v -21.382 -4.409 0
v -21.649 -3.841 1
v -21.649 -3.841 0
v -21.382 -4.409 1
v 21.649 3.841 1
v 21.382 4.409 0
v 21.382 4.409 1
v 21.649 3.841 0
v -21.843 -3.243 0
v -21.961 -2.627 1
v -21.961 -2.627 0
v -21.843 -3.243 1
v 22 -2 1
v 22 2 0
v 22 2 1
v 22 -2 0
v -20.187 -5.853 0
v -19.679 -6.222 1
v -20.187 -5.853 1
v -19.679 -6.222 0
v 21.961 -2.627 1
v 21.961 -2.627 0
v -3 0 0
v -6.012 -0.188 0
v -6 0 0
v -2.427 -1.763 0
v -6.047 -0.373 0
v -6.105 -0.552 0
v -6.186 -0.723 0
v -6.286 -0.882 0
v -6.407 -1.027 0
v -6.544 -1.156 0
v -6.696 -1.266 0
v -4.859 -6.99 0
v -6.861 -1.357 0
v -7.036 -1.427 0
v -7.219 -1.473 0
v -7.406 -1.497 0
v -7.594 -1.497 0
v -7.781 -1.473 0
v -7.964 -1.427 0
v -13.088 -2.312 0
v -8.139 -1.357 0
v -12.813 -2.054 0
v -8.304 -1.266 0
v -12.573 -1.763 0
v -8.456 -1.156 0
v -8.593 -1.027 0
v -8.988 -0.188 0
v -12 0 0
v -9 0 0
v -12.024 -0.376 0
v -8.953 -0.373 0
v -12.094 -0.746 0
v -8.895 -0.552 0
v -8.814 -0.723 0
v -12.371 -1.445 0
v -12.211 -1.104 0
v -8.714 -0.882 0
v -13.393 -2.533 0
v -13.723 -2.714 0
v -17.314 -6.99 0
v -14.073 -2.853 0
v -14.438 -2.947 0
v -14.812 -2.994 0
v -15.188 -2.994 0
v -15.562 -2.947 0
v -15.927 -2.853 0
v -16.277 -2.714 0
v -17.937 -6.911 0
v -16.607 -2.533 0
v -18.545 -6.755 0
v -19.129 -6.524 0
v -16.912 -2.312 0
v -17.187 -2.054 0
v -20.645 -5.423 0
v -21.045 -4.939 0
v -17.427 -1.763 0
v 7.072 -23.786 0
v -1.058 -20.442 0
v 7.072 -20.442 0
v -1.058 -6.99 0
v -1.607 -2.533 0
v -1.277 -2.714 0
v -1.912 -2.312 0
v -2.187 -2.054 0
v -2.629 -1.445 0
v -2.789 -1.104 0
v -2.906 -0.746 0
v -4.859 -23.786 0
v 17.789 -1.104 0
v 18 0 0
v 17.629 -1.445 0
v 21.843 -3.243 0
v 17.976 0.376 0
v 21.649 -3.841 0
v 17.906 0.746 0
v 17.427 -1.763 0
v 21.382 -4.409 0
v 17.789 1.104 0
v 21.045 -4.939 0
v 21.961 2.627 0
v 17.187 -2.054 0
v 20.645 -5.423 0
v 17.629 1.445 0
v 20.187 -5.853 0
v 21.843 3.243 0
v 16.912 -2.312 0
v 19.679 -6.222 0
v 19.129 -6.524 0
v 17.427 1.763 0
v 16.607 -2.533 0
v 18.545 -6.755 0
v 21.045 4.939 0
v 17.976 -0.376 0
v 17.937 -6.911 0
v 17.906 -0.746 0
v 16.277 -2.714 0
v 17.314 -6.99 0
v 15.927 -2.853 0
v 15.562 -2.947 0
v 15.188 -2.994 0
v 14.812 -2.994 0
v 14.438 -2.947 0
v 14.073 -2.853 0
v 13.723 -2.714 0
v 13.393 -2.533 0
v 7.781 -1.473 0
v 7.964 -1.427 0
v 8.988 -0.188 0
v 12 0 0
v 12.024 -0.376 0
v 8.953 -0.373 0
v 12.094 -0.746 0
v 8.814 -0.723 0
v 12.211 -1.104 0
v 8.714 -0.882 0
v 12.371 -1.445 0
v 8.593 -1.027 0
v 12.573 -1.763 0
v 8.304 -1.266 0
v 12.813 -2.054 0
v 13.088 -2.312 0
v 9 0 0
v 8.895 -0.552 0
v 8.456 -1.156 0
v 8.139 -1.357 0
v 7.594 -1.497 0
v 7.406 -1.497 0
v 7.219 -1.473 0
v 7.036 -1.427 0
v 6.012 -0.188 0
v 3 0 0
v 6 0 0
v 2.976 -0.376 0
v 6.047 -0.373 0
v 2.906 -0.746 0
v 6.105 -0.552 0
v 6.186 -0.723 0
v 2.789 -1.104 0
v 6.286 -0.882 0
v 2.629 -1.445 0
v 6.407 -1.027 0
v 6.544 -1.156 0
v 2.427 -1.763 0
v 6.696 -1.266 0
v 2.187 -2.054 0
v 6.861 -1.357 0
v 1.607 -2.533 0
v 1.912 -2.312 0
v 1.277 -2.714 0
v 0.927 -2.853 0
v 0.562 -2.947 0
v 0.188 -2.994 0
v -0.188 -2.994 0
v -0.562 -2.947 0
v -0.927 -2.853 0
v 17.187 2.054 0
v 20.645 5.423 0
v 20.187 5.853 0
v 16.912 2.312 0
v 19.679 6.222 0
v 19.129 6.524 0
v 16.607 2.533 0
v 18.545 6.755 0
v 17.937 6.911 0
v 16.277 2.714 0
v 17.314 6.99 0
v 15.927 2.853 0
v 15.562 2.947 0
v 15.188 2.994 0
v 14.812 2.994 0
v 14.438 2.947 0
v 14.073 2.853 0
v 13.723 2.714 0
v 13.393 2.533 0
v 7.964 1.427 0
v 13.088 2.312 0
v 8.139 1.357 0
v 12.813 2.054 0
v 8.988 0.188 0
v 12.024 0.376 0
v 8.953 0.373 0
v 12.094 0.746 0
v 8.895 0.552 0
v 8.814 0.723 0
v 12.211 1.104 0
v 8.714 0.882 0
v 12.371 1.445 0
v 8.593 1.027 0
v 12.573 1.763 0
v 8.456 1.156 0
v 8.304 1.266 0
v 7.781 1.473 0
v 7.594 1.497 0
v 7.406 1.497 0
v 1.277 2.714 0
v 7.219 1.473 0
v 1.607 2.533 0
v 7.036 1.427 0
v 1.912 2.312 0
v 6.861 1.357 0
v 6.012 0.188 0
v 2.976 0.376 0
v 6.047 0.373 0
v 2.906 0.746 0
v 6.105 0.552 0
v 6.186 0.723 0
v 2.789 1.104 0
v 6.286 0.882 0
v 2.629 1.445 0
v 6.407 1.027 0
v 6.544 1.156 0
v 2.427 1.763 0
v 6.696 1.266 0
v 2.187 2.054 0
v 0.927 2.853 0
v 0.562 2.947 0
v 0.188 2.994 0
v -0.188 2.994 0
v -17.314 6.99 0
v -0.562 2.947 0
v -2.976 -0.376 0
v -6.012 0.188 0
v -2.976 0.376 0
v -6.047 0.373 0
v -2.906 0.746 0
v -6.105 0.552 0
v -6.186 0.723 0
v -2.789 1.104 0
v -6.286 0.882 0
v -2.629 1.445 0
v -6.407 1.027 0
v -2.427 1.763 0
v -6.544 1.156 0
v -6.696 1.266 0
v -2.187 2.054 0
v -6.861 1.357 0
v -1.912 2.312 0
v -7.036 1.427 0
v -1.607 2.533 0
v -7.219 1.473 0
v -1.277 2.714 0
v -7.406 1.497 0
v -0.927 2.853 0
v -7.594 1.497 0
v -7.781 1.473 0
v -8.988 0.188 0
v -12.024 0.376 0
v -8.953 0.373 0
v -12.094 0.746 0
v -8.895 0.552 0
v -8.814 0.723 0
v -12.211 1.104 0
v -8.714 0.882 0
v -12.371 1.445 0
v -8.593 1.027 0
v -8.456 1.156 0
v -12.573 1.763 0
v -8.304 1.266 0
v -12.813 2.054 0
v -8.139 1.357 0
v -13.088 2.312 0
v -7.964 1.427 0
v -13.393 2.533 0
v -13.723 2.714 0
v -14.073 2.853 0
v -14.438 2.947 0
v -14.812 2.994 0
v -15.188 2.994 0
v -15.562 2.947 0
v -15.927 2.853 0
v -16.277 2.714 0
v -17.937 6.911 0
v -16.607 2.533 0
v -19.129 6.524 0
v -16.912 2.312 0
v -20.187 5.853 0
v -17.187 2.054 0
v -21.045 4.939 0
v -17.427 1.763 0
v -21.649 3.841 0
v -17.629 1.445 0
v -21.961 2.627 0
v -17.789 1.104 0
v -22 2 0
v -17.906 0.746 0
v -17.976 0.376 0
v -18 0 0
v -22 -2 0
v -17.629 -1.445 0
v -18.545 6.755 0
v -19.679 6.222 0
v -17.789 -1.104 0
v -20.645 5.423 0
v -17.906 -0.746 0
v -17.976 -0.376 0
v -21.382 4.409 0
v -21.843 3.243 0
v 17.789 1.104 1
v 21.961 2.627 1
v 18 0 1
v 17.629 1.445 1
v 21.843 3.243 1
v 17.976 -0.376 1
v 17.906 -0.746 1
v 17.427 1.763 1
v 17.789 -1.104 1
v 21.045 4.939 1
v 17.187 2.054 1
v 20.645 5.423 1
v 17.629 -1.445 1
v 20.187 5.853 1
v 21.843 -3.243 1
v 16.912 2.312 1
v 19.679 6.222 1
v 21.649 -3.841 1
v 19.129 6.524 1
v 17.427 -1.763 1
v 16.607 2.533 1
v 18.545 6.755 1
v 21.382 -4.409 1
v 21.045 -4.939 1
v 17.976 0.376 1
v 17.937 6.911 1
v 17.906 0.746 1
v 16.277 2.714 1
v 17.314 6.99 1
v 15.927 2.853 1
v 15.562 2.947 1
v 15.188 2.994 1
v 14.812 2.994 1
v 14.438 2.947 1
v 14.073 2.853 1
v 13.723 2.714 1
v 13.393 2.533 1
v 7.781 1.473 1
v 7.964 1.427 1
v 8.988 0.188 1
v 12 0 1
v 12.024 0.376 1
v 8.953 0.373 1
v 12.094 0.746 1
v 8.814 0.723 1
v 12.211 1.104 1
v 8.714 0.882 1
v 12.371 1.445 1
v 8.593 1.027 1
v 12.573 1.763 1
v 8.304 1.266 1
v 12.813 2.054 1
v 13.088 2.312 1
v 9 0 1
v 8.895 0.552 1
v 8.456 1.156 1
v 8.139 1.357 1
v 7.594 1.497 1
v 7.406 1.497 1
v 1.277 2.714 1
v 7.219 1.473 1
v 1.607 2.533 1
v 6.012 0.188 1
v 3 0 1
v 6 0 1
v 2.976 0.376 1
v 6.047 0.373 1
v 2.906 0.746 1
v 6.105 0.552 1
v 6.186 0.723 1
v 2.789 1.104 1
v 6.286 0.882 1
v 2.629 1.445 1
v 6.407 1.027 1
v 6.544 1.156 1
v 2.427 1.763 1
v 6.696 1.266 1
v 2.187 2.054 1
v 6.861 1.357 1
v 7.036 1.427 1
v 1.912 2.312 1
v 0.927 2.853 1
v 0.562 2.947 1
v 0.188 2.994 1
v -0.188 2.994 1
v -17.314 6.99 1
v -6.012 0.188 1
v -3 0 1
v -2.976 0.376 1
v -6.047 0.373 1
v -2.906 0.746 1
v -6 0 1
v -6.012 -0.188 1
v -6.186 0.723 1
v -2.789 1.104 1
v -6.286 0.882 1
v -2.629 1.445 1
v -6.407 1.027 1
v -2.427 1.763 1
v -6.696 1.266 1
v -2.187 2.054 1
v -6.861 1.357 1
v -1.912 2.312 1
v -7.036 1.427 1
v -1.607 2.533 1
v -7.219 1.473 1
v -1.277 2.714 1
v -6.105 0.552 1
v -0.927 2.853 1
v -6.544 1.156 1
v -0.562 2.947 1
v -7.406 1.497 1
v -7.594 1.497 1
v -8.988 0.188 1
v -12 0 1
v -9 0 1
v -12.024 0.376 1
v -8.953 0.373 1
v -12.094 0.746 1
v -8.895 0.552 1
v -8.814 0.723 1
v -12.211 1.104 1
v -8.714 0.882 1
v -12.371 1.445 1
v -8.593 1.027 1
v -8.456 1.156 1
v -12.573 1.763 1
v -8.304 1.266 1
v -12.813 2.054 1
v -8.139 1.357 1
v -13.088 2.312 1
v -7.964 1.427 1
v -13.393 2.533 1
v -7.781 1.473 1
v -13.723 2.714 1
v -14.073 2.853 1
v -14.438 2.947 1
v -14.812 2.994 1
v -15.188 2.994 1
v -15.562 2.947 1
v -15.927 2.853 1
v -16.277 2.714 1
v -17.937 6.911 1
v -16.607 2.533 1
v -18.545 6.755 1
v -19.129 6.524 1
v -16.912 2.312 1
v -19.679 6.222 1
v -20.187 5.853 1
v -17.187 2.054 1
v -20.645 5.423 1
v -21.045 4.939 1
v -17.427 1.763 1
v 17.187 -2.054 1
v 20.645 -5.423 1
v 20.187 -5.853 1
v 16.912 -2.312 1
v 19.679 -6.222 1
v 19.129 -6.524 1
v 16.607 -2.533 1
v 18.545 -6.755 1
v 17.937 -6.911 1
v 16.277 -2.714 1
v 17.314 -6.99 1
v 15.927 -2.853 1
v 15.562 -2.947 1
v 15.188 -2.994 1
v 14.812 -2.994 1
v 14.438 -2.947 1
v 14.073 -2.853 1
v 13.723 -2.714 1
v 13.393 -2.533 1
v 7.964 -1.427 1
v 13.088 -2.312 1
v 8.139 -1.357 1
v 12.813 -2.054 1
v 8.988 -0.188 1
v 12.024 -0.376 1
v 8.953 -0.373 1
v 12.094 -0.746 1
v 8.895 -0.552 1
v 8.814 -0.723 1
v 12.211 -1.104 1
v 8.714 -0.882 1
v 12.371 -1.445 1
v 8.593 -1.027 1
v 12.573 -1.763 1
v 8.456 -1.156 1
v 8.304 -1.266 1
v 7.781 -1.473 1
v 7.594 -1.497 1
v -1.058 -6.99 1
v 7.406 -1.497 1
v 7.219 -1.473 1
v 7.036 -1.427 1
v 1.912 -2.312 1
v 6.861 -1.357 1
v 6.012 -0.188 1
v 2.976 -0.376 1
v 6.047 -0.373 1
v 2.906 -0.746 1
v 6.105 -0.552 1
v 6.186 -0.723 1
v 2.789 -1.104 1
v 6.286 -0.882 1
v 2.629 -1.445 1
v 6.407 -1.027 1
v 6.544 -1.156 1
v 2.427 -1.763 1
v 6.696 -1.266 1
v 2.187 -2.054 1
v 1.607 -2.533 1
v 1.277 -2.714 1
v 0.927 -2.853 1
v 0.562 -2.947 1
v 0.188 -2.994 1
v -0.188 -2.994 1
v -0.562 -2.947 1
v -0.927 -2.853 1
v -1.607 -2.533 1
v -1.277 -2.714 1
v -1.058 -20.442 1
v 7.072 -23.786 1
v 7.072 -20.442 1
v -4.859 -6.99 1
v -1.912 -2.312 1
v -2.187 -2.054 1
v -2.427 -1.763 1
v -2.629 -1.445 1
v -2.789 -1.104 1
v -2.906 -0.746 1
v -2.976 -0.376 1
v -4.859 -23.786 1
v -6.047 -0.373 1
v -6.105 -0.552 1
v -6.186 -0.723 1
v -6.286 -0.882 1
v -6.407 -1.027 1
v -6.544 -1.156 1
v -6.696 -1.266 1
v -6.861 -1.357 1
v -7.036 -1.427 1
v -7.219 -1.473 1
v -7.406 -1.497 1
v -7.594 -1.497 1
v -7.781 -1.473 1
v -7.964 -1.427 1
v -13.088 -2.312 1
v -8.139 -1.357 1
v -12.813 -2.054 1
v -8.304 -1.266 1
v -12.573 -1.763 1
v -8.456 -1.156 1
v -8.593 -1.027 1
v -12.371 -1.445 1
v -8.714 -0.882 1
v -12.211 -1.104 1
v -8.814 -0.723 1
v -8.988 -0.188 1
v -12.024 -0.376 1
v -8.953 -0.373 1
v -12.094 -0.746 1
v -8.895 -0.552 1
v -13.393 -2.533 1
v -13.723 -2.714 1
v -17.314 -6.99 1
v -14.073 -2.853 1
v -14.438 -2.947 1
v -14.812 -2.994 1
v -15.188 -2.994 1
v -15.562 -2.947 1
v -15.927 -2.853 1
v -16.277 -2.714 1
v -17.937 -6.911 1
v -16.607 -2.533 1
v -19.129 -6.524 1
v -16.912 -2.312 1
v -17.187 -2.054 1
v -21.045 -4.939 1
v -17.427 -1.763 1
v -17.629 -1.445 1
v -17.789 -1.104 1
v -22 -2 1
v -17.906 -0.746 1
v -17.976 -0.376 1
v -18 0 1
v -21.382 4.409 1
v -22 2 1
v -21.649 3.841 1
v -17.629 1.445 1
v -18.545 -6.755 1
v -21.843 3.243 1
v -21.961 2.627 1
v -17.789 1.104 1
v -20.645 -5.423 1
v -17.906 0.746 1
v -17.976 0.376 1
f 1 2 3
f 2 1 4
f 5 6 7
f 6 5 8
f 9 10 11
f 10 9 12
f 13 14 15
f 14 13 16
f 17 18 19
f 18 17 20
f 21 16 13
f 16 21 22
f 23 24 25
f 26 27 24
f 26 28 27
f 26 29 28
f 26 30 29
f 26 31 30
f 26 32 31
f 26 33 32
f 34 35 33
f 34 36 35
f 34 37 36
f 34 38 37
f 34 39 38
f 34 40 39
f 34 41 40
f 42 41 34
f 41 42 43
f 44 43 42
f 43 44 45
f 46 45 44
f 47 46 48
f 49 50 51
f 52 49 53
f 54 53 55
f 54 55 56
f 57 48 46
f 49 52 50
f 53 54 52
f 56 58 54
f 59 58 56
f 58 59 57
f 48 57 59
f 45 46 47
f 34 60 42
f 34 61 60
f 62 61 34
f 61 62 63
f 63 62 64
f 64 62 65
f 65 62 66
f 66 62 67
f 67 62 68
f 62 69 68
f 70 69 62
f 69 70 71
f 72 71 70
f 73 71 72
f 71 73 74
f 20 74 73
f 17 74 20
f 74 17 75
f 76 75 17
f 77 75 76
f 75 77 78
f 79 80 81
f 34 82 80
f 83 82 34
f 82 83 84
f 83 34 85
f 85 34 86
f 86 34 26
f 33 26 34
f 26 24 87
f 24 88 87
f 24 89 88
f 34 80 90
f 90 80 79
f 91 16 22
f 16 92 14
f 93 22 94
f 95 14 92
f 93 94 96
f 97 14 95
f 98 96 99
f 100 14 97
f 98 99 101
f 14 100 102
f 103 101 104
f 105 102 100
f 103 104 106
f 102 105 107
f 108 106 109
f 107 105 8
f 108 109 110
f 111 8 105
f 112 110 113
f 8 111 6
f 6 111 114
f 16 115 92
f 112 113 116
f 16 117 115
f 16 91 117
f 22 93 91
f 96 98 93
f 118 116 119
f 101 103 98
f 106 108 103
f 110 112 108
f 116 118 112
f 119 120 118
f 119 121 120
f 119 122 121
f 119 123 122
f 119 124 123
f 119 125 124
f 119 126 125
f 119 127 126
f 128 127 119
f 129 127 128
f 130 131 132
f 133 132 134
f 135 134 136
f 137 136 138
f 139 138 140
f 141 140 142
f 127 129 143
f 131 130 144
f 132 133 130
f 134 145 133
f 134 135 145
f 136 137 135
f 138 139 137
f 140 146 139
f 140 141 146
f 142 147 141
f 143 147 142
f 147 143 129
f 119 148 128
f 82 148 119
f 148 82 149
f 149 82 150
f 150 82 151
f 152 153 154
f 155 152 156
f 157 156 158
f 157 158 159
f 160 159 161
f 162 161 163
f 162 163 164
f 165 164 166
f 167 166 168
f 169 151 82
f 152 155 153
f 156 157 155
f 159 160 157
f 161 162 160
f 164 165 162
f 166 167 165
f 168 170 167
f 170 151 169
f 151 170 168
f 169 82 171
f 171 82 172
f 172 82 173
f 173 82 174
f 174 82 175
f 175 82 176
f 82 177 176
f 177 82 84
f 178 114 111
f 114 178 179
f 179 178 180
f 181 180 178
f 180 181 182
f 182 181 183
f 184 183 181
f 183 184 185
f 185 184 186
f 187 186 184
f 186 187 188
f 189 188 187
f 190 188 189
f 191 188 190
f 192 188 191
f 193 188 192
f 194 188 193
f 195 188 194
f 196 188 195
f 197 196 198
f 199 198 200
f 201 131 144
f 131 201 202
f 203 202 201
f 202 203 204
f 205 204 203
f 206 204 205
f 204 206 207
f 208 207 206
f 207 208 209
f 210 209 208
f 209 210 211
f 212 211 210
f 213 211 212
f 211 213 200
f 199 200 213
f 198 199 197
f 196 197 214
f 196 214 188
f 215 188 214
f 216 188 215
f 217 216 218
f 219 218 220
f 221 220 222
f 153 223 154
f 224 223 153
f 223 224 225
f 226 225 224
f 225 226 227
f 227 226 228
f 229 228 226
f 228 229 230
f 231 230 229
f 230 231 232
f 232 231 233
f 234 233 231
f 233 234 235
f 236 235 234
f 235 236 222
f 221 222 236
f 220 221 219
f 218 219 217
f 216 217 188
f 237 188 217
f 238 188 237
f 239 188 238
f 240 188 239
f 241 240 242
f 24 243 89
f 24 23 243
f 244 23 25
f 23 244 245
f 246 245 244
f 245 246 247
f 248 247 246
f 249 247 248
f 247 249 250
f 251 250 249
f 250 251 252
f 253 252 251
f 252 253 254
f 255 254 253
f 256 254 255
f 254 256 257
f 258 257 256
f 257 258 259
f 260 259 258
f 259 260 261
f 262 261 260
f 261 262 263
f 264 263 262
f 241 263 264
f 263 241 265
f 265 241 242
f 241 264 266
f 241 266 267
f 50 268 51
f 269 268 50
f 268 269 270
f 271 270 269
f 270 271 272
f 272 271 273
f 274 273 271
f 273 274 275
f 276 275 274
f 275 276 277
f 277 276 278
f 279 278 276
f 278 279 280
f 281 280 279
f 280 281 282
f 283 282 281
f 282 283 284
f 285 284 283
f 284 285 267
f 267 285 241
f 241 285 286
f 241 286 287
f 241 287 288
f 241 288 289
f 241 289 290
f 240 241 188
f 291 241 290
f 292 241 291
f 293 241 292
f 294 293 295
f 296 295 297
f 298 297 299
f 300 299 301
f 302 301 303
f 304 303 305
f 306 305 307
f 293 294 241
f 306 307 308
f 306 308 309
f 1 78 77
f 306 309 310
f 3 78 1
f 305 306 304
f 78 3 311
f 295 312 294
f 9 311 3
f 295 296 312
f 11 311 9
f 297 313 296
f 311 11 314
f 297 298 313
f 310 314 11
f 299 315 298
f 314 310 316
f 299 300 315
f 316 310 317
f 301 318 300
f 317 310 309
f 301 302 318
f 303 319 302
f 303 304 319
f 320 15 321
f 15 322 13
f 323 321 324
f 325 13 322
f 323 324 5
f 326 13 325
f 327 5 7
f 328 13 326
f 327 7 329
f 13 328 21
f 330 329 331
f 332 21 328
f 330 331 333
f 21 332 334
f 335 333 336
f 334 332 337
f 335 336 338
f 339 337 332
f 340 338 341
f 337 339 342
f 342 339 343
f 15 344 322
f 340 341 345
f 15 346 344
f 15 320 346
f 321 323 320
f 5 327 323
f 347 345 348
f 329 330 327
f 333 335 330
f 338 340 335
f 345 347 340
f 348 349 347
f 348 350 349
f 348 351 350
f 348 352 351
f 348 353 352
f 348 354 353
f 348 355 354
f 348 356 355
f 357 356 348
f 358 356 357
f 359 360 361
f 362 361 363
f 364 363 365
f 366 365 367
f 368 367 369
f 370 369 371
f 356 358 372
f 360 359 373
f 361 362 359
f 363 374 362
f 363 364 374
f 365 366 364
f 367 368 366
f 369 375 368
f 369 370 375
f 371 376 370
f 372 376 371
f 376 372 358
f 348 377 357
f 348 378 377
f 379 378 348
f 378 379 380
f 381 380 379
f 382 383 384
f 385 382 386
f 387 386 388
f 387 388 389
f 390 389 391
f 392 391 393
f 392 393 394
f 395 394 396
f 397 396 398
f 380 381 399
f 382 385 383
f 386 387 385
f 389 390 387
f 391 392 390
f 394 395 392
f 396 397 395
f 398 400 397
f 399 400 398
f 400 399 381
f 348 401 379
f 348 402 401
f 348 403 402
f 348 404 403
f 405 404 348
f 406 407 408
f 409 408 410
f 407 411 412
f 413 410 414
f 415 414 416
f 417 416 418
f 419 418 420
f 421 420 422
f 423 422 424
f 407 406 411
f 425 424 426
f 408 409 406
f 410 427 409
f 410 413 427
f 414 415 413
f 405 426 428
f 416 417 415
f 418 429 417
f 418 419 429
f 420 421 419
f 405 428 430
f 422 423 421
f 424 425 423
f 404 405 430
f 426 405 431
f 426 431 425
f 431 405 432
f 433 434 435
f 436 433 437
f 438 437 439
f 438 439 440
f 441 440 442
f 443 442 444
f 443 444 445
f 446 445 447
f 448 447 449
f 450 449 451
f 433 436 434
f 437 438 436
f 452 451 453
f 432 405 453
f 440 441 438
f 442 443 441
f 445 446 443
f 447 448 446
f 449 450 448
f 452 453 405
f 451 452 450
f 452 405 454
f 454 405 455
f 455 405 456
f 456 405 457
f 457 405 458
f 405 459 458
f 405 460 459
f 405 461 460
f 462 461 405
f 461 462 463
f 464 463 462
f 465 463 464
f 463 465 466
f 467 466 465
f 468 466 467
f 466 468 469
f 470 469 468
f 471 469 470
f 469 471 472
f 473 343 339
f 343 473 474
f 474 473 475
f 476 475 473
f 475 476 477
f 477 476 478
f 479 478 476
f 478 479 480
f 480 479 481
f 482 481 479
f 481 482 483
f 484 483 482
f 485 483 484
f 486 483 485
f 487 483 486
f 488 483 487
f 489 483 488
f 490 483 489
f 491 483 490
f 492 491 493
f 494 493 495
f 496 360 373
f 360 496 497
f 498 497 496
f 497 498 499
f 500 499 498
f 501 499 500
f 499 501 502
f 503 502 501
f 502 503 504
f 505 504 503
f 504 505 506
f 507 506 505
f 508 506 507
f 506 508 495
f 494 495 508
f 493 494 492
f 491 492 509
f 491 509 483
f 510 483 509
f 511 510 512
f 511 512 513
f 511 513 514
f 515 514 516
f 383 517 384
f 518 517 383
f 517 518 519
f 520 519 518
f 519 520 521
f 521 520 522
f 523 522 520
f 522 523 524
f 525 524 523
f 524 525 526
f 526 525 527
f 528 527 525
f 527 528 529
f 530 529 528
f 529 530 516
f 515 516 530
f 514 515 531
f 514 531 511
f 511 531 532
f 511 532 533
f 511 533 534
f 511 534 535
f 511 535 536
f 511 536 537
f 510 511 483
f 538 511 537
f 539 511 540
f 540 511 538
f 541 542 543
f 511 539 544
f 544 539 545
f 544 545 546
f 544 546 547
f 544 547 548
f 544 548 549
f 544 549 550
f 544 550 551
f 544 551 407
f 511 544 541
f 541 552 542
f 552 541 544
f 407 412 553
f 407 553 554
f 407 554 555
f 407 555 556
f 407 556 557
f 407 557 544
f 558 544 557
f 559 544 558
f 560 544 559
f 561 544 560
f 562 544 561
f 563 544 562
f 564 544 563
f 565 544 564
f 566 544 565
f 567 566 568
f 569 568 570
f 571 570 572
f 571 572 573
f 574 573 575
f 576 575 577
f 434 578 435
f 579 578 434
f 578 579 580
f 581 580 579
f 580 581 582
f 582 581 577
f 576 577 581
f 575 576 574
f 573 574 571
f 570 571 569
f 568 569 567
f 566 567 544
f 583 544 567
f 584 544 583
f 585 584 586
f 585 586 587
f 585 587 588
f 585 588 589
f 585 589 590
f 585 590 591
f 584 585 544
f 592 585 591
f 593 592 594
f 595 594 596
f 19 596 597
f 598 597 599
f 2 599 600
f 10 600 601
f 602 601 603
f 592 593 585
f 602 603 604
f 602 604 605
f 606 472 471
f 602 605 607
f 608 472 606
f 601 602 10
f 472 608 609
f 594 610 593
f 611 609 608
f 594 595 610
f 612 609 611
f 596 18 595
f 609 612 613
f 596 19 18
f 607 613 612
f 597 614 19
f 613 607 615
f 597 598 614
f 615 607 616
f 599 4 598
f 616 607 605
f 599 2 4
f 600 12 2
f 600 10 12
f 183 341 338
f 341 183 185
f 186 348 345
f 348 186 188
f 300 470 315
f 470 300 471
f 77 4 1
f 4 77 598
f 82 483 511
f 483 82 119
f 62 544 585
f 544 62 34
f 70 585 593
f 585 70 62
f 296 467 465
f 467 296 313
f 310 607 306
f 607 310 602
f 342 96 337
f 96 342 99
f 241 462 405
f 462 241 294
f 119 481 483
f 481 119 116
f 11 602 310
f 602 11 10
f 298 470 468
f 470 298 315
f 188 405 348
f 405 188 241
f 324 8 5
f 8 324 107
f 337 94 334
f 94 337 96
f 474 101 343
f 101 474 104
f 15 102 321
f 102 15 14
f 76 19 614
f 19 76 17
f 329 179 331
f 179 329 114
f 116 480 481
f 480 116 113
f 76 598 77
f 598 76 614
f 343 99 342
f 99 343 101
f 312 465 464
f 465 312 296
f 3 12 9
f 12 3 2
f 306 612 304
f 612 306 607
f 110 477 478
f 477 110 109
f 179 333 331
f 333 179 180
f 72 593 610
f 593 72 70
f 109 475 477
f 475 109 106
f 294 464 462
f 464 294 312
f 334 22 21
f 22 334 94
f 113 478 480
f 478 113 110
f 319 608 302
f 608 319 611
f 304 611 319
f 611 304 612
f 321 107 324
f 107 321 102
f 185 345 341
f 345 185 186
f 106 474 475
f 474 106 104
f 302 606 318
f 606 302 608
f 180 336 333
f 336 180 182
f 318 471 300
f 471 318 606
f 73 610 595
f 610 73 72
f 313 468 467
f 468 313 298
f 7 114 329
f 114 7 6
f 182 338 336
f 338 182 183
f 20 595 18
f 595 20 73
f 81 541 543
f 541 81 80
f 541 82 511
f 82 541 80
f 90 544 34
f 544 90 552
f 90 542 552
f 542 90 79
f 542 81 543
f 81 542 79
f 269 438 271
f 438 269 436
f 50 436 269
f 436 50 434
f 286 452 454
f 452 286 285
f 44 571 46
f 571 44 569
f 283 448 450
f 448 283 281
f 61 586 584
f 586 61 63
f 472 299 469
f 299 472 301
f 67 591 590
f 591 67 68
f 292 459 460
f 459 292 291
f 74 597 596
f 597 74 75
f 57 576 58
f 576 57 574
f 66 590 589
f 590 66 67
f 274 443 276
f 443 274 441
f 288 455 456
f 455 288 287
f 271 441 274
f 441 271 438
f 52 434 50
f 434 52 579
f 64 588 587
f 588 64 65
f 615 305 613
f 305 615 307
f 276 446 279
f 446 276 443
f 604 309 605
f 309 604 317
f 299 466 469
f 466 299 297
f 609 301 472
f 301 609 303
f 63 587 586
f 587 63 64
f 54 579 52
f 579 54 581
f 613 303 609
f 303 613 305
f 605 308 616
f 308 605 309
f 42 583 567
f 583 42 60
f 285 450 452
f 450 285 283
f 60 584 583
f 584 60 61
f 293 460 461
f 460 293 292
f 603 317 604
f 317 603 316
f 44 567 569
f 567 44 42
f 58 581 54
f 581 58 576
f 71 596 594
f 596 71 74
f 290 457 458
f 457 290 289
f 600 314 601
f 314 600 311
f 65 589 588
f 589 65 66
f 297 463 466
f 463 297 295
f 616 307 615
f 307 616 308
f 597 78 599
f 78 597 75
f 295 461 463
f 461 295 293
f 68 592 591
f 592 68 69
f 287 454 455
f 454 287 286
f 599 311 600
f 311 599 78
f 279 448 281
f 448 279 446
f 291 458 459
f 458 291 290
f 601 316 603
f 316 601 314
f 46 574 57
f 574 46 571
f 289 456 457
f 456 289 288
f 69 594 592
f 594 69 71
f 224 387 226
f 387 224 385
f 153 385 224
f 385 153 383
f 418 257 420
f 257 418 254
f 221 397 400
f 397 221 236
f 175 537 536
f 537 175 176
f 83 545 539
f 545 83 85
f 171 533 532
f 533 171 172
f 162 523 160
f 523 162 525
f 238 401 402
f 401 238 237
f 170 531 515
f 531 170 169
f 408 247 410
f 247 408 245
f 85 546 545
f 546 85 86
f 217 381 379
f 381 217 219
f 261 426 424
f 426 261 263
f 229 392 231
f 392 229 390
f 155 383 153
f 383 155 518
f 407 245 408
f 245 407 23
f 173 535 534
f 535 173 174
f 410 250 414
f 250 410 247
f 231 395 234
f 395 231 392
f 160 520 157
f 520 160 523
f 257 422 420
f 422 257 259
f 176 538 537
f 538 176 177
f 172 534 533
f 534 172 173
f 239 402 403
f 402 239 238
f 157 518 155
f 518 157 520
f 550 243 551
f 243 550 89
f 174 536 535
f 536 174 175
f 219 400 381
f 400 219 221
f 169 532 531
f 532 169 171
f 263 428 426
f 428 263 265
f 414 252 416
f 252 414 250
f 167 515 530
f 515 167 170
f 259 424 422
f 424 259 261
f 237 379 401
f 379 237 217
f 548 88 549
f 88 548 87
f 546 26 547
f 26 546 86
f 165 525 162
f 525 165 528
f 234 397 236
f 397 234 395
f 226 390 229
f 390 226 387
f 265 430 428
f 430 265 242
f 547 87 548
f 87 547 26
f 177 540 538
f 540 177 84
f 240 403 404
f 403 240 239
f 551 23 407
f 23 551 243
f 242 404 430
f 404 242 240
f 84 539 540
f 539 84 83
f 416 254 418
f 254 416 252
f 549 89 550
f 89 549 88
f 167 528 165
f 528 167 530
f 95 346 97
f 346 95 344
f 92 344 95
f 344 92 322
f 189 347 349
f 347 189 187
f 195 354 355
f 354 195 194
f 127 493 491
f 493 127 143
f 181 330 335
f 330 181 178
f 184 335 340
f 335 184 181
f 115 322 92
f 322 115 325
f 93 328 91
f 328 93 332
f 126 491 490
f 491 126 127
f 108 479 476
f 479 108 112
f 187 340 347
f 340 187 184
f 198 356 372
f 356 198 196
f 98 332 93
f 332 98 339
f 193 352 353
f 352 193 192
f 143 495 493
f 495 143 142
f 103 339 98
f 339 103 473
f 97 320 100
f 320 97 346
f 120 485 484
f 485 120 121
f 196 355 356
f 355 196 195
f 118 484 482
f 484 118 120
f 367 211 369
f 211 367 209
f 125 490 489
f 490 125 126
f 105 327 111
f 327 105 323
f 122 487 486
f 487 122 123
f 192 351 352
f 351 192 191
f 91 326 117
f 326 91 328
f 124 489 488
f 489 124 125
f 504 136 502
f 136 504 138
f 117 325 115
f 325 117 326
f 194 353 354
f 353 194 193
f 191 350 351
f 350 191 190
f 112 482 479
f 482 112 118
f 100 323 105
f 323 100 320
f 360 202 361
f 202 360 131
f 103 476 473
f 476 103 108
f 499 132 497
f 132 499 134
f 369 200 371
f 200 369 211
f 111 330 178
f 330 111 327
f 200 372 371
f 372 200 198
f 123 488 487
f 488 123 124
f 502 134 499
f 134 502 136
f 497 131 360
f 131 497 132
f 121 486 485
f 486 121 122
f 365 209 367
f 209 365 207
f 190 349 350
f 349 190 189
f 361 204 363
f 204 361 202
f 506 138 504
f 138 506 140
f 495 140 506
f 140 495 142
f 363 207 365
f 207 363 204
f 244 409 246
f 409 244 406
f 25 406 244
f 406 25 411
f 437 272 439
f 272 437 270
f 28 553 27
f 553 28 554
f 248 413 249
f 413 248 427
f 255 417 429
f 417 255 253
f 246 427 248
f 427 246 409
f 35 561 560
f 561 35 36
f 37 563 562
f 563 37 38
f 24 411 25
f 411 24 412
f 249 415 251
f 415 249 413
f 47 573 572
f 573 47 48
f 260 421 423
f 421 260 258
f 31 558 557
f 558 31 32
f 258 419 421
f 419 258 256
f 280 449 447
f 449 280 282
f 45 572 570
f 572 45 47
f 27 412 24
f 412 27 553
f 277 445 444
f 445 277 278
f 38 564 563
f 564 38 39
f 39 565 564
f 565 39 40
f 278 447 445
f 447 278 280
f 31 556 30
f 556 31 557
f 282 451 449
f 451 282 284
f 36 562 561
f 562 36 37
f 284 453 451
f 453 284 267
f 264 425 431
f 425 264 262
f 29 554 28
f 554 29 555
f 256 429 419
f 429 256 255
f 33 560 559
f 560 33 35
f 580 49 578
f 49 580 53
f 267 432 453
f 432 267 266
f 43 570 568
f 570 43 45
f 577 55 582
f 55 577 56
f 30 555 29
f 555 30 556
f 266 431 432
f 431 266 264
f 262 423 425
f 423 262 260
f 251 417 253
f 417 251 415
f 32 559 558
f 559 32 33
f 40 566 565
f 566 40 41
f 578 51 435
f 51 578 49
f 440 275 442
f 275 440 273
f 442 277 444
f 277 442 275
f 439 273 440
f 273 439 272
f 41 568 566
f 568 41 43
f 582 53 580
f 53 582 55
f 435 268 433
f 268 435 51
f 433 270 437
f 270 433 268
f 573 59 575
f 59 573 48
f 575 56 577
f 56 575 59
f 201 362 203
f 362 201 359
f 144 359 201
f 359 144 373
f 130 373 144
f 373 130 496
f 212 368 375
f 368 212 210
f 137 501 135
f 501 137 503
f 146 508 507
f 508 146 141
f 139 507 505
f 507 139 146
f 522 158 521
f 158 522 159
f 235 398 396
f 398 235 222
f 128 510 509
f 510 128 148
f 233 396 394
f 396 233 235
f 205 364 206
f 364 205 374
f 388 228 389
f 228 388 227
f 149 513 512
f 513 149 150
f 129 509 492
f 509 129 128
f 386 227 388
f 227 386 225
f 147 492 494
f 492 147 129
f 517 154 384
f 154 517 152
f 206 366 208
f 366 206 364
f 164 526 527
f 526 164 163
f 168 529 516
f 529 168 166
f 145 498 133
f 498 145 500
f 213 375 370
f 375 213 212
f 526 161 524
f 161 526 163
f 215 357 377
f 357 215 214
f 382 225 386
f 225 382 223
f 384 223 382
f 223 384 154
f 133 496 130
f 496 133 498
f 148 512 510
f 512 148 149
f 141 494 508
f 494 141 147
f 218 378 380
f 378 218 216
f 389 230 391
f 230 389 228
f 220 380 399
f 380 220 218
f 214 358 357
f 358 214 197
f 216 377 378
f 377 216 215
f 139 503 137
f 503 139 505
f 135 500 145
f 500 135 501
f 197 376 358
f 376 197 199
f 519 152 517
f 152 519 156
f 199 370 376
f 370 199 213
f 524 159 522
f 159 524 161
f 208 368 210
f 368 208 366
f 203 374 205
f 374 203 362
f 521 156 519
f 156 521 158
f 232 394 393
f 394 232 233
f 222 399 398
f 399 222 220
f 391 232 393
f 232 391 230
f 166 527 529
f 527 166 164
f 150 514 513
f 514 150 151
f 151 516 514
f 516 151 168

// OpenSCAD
$fn = 50;


difference() {
	union() {
		hull() {
			translate(v = [-17.0000000000, 2.0000000000, 0]) {
				cylinder(h = 1, r = 5);
			}
			translate(v = [17.0000000000, 2.0000000000, 0]) {
				cylinder(h = 1, r = 5);
			}
			translate(v = [-17.0000000000, -2.0000000000, 0]) {
				cylinder(h = 1, r = 5);
			}
			translate(v = [17.0000000000, -2.0000000000, 0]) {
				cylinder(h = 1, r = 5);
			}
		}
		translate(v = [0, -5, 0]) {
			linear_extrude(height = 1) {
				text(font = "DejaVu Sans Mono:style=Bold", halign = "center", size = 19.0000000000, text = "L", valign = "top");
			}
		}
	}
	union() {
		translate(v = [-15.0000000000, 0.0000000000, 0]) {
			translate(v = [0, 0, -100]) {
				cylinder(h = 200, r = 3.0000000000);
			}
		}
		translate(v = [0, 0, -100]) {
			cylinder(h = 200, r = 3.0000000000);
		}
		translate(v = [15.0000000000, 0.0000000000, 0]) {
			translate(v = [0, 0, -100]) {
				cylinder(h = 200, r = 3.0000000000);
			}
		}
		translate(v = [-15.0000000000, 0.0000000000, 0]) {
			translate(v = [0, 0, -100]) {
				cylinder(h = 200, r = 1.5000000000);
			}
		}
		translate(v = [-7.5000000000, 0.0000000000, 0]) {
			translate(v = [0, 0, -100]) {
				cylinder(h = 200, r = 1.5000000000);
			}
		}
		translate(v = [0, 0, -100]) {
			cylinder(h = 200, r = 1.5000000000);
		}
		translate(v = [7.5000000000, 0.0000000000, 0]) {
			translate(v = [0, 0, -100]) {
				cylinder(h = 200, r = 1.5000000000);
			}
		}
		translate(v = [15.0000000000, 0.0000000000, 0]) {
			translate(v = [0, 0, -100]) {
				cylinder(h = 200, r = 1.5000000000);
			}
		}
	}
}
